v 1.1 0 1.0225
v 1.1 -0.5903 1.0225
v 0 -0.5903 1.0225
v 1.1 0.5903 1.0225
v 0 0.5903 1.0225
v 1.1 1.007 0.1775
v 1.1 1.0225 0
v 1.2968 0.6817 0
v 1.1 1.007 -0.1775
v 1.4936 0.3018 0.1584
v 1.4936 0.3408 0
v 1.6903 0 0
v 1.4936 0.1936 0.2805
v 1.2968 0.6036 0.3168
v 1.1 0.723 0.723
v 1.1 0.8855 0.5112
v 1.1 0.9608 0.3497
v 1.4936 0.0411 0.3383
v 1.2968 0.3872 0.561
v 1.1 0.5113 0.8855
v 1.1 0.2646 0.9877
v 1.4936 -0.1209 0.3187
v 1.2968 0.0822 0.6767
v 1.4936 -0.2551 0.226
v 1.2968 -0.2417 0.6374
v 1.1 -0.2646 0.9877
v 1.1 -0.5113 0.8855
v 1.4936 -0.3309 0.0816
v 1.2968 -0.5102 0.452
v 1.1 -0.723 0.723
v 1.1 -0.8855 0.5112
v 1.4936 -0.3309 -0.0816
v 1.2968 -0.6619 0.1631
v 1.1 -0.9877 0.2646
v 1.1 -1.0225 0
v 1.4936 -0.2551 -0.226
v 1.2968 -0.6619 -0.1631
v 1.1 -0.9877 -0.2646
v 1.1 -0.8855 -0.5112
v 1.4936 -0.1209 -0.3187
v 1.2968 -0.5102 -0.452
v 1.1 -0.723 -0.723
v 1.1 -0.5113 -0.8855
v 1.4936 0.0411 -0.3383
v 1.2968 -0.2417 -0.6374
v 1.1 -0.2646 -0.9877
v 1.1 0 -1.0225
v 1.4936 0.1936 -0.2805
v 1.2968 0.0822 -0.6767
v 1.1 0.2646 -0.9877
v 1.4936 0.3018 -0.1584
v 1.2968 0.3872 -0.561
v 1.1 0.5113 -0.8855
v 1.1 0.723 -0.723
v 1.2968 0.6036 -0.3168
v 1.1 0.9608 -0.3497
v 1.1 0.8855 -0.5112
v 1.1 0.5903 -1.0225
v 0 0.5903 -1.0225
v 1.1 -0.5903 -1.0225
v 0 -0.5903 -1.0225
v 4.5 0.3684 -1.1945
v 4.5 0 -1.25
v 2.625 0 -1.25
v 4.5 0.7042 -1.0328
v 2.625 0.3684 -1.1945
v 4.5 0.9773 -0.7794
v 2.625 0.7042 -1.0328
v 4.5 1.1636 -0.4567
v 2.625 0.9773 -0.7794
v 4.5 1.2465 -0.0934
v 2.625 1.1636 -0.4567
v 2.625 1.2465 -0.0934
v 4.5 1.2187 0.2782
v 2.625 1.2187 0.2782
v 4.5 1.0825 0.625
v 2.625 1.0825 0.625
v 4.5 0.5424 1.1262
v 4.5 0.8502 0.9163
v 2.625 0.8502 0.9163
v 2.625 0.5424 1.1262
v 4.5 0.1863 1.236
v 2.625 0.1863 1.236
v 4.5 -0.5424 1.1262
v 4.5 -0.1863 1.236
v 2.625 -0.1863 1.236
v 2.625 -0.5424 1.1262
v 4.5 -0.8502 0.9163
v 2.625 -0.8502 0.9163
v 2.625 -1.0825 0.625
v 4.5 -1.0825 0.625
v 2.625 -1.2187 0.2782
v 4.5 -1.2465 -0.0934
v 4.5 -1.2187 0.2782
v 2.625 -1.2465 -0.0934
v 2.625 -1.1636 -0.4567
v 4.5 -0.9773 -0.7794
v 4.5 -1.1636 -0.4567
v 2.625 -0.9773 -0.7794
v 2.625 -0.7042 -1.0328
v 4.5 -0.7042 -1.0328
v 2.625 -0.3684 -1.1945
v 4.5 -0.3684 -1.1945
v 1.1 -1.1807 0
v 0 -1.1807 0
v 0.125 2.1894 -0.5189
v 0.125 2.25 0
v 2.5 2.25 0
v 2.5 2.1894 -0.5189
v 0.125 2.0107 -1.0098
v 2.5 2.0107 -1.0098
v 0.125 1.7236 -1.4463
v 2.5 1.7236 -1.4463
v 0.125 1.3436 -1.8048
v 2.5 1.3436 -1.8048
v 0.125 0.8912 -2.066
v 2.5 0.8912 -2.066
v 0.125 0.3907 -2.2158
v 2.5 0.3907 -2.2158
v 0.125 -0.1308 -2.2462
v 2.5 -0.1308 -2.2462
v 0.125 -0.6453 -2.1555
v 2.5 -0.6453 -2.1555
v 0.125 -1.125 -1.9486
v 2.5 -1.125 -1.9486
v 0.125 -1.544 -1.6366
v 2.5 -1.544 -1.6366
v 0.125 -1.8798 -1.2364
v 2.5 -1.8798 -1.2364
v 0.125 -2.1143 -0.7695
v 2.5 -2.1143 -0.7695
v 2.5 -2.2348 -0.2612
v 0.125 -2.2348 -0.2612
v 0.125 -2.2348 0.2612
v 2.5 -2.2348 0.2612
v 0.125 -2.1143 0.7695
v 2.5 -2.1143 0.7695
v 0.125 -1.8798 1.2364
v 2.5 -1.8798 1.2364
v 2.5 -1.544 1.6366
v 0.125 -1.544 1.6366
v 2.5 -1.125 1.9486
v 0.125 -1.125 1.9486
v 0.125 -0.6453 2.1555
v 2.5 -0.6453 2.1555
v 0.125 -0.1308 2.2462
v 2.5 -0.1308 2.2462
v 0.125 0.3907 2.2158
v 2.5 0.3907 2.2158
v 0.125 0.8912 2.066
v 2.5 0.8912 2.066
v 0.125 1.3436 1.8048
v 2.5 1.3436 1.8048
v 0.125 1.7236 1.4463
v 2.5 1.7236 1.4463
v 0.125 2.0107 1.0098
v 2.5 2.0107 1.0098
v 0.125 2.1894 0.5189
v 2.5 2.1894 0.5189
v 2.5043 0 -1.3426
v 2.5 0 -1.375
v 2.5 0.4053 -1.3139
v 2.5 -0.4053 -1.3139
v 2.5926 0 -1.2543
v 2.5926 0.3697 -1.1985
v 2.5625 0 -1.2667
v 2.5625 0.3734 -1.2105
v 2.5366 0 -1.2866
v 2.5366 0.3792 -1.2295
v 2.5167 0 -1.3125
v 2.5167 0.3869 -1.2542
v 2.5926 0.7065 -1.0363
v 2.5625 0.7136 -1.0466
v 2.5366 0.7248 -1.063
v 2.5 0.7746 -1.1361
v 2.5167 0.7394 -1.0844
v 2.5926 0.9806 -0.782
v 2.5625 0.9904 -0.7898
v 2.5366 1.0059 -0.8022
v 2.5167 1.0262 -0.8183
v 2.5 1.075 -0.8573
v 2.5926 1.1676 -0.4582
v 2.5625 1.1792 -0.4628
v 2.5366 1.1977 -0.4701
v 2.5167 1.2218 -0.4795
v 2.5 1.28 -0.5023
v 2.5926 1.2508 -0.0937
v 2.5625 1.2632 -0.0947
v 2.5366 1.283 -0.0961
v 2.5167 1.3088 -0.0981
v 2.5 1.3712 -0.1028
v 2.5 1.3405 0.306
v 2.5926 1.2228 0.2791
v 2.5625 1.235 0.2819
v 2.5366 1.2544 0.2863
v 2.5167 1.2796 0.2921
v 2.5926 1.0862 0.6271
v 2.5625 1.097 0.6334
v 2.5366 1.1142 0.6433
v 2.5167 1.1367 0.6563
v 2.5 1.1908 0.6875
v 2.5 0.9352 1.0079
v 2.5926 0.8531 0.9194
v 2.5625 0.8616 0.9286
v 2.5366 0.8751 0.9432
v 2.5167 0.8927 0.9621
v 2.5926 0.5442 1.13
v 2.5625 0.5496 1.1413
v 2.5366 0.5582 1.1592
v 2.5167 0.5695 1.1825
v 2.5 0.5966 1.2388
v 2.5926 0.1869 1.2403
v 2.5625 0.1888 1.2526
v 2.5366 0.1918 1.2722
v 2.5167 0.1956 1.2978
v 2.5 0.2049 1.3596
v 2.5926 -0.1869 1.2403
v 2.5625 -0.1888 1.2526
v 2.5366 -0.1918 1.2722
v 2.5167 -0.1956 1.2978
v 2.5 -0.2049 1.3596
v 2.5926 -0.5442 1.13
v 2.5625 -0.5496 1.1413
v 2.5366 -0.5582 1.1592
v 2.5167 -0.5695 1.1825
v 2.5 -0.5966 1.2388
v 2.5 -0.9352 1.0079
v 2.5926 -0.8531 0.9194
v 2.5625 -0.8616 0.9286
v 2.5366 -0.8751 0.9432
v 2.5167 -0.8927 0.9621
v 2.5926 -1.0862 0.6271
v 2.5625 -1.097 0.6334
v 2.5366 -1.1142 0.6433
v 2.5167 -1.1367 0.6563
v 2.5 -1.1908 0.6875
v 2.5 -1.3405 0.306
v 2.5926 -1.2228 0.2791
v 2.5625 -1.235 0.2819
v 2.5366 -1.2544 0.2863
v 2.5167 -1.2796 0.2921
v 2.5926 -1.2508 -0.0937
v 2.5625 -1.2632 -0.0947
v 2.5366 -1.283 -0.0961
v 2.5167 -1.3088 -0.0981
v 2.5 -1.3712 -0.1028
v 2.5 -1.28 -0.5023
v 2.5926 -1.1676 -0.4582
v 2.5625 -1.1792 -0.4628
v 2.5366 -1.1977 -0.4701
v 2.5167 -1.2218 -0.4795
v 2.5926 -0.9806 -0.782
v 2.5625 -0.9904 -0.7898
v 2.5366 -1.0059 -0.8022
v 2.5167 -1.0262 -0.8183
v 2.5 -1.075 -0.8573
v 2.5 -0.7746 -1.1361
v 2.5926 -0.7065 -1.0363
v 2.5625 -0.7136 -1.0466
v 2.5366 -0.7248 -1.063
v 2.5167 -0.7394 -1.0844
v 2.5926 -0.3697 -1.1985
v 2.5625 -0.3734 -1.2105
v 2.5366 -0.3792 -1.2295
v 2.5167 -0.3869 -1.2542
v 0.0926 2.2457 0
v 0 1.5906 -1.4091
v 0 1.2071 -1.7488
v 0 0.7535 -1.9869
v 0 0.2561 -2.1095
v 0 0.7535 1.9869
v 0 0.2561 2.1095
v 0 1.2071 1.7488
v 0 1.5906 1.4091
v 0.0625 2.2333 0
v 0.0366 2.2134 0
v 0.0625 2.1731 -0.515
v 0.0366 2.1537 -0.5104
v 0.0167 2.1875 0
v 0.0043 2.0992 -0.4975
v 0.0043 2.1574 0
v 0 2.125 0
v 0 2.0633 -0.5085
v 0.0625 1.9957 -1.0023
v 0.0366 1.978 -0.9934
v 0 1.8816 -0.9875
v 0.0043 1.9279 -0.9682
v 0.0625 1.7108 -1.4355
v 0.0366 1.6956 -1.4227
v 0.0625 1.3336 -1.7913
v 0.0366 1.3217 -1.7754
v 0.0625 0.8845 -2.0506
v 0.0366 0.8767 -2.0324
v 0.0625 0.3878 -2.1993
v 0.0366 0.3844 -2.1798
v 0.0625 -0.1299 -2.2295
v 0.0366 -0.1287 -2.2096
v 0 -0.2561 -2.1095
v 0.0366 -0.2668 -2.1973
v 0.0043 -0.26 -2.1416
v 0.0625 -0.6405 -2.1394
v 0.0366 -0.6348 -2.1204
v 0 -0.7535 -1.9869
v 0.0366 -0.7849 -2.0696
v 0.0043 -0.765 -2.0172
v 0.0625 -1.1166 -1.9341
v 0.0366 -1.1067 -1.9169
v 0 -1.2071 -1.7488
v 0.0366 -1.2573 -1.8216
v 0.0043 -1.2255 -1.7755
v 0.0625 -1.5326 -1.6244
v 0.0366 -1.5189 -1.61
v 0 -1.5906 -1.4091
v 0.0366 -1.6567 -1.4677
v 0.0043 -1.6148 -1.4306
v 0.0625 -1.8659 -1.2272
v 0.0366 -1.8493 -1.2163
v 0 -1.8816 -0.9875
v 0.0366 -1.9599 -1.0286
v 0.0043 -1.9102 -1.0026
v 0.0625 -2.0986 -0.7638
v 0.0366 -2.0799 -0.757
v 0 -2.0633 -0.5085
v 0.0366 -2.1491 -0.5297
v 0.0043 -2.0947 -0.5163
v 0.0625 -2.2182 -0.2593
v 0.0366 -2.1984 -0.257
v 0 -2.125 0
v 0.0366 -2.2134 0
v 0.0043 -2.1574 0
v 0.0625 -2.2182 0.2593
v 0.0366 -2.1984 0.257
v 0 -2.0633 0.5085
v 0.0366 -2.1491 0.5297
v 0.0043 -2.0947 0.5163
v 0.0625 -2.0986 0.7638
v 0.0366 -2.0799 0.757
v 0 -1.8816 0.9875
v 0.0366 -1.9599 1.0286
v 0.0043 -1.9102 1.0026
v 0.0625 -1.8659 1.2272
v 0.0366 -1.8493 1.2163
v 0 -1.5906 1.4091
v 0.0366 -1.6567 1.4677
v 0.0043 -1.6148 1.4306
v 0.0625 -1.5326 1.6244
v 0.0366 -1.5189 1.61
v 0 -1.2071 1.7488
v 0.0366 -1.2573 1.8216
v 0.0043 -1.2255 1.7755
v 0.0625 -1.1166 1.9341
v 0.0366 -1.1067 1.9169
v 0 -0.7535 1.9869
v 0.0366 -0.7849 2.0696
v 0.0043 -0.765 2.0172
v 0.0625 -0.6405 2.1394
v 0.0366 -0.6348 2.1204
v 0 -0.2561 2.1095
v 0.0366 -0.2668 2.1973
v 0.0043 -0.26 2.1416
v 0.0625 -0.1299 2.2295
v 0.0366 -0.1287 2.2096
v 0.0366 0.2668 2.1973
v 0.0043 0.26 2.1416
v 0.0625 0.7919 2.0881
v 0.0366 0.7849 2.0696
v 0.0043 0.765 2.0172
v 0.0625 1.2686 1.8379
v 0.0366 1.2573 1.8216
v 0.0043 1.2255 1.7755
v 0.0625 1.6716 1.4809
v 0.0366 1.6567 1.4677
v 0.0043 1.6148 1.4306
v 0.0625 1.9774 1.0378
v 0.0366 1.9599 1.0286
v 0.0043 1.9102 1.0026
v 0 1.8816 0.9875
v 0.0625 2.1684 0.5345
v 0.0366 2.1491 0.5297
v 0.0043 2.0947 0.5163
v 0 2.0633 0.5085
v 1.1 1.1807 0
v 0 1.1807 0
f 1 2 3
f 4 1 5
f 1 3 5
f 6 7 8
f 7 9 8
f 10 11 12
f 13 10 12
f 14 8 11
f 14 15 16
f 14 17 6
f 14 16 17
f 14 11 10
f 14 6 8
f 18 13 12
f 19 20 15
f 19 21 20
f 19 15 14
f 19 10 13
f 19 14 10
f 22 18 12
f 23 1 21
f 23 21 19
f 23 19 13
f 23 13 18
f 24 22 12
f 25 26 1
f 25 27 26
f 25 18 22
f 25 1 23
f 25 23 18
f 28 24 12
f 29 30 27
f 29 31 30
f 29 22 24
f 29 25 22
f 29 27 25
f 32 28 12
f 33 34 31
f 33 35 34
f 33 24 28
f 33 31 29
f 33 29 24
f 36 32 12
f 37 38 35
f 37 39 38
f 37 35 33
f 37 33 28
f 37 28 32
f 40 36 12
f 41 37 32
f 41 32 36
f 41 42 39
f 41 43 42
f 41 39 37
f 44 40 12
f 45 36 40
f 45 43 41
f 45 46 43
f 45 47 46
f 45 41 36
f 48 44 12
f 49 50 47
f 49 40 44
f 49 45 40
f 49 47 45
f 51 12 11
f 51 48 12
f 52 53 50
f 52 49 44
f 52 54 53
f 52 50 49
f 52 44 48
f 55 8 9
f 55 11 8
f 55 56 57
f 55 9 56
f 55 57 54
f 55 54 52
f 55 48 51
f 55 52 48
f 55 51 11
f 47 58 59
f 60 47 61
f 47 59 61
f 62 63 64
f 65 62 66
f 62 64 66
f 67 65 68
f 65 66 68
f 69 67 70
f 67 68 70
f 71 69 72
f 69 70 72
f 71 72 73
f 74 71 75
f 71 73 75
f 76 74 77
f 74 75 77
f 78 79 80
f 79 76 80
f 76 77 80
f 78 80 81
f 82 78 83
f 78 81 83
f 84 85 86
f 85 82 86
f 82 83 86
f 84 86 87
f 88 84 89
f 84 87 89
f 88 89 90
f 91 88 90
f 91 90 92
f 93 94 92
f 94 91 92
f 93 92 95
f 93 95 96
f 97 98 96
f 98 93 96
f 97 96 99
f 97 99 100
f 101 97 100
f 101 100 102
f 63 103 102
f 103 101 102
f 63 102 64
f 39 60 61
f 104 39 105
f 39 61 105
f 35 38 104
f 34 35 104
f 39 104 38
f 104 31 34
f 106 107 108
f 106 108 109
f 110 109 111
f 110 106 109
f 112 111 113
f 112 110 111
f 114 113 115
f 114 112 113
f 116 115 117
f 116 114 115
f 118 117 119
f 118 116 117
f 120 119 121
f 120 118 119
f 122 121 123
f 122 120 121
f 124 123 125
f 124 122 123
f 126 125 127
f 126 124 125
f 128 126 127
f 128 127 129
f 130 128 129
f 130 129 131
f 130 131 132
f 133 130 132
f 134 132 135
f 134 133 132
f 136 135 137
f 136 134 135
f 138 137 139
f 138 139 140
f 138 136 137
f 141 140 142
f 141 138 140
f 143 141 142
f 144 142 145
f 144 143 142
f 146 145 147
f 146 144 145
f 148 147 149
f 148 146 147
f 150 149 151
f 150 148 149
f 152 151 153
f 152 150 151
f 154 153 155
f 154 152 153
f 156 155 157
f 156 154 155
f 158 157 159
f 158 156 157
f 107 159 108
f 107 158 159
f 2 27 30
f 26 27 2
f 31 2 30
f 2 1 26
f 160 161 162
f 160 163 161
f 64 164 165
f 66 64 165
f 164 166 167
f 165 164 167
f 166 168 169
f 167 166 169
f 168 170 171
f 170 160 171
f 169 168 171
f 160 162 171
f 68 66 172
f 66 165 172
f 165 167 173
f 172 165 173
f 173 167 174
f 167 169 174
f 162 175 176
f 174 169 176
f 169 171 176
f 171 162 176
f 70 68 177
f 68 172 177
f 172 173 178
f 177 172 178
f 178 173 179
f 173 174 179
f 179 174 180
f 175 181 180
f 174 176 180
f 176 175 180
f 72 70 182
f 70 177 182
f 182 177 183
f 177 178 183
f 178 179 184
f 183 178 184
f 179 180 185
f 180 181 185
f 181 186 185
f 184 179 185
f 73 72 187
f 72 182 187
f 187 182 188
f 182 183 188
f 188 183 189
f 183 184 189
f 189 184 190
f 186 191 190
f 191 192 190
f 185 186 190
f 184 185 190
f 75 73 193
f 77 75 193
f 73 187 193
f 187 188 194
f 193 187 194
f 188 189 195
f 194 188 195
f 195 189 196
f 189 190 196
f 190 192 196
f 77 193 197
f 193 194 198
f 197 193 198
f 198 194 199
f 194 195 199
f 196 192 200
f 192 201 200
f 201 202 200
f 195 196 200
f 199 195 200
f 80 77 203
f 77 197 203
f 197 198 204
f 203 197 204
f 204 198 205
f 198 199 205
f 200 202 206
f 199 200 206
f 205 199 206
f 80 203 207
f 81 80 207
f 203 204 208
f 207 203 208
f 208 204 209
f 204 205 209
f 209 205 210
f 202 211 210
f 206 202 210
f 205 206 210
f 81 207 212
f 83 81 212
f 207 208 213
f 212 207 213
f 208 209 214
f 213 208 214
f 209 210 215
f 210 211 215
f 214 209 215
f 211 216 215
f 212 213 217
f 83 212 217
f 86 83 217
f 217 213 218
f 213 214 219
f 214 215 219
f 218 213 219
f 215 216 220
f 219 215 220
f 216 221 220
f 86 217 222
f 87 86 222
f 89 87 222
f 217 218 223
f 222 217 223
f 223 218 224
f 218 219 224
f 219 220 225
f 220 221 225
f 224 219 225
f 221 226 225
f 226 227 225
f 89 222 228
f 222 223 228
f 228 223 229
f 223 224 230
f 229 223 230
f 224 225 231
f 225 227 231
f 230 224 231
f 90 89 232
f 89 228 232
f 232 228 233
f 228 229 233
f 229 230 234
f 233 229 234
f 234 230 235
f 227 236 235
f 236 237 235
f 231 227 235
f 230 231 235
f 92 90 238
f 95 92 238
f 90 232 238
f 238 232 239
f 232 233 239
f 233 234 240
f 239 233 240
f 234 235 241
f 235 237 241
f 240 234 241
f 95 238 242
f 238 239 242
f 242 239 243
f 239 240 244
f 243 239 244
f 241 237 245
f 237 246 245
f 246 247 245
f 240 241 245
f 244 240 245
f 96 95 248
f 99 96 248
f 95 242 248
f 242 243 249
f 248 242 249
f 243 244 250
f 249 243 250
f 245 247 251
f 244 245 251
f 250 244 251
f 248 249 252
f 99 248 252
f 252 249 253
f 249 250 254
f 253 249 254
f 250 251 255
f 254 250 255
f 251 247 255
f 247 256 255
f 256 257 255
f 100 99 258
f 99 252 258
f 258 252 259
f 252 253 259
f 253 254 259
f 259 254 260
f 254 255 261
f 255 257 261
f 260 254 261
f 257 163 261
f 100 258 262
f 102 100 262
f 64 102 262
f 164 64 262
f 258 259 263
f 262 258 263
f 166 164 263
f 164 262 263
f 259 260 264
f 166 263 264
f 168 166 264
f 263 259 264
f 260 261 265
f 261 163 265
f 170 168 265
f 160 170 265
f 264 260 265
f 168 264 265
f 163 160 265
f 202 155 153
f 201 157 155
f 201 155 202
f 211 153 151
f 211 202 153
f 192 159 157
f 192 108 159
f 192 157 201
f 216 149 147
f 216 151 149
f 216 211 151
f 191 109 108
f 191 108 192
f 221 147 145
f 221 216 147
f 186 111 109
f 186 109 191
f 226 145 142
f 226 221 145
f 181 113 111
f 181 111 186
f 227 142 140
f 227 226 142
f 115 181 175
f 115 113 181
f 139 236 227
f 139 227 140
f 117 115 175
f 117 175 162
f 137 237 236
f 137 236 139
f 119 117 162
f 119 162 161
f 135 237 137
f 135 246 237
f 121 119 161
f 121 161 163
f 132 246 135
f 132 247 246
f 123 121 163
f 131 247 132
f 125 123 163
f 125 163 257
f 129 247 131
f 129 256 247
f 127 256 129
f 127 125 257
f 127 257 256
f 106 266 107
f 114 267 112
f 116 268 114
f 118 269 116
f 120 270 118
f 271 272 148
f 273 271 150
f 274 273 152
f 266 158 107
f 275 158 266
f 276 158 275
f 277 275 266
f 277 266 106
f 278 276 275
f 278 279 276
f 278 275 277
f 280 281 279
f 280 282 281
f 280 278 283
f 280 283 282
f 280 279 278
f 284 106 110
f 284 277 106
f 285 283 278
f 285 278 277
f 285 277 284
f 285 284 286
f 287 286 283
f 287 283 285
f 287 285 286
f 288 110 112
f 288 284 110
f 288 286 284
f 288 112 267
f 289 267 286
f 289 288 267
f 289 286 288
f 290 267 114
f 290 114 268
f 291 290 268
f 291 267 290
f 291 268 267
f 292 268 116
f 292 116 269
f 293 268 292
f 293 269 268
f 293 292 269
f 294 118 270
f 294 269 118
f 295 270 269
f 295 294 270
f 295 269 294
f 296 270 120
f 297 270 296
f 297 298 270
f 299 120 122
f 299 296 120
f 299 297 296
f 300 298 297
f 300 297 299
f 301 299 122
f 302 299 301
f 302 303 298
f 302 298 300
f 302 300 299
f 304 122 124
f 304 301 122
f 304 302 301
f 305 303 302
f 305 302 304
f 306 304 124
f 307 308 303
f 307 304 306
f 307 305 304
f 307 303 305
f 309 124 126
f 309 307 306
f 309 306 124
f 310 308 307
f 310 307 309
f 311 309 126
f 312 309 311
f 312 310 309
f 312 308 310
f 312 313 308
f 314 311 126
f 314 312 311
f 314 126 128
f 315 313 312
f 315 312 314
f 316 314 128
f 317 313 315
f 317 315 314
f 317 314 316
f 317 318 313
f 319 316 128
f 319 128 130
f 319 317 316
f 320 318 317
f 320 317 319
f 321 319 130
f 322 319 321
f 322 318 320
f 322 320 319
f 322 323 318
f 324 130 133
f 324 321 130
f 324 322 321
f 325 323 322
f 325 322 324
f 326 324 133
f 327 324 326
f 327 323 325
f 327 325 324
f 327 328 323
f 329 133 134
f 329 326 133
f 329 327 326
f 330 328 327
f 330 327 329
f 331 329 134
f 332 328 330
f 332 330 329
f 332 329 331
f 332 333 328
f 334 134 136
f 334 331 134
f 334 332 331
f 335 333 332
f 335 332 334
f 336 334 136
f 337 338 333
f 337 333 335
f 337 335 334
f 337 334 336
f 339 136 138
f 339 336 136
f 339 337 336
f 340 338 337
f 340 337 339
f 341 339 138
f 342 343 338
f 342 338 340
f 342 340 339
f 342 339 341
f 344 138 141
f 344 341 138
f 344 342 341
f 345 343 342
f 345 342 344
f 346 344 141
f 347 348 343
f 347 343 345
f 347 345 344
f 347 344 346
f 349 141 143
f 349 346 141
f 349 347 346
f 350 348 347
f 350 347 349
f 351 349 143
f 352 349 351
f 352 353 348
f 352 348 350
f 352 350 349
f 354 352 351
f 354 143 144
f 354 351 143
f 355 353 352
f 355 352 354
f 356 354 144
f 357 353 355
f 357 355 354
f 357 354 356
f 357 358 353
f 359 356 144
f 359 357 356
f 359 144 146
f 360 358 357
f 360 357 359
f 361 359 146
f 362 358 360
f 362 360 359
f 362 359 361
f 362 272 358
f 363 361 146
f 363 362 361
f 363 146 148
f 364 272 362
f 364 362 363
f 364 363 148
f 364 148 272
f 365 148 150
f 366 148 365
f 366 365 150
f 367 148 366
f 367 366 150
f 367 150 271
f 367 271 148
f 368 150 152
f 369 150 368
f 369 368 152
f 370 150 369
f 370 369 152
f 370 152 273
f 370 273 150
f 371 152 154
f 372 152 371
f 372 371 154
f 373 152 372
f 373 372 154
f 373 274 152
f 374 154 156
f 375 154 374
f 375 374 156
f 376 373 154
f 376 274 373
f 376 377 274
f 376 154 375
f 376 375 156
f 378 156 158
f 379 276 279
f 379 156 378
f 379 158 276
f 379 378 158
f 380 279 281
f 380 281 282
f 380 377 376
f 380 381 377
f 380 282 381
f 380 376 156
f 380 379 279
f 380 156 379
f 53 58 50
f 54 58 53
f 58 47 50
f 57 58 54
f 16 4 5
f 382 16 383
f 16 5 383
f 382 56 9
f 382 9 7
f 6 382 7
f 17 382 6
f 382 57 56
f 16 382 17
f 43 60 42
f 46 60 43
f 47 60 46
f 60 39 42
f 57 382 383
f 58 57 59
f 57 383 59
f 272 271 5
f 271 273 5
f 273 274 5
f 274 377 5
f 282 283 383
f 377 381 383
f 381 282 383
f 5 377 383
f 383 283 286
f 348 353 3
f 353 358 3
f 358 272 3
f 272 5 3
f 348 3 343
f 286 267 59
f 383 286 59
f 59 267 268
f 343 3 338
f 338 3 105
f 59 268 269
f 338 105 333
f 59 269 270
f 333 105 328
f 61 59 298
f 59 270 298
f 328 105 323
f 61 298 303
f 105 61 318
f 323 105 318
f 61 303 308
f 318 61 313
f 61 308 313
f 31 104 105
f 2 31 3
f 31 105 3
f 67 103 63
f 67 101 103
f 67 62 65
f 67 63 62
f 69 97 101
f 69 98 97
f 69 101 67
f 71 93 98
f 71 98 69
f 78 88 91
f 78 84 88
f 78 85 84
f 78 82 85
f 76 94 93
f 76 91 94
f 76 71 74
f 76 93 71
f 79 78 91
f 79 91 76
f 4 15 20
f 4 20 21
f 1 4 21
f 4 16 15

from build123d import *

# Parameters (mm, degrees)
SKETCH1_W               = 2.5
SKETCH1_H               = 2.25
SKETCH2_R               = 1.25
BOSS_EXTRUDE1_DEPTH     = 8
CUT_EXTRUDE1_DEPTH      = 1.1
CHAMFER1_SIZE           = 0.2535
FILLET1_R               = 0.125
SKETCH5_W               = 6
SKETCH5_H               = 4.609791228
CUT_EXTRUDE2_DEPTH      = 10
CUT_EXTRUDE2_DEPTH_BACK = 10


with BuildPart() as part:
    # Sketch1 → Revolve1 (revolve)
    with BuildSketch(Plane(origin=(0, 0, 0), x_dir=(-1, 0, 0), z_dir=(0, 0, -1))):
        with Locations((-1.25, 1.125)):
            Rectangle(SKETCH1_W, SKETCH1_H)
    revolve(axis=Axis((2.5, 0, 0), (-1, 0, 0)))

    # Sketch2 → Boss-Extrude1 (add)
    with BuildSketch(Plane(origin=(2.5, 0, 0), x_dir=(0, 0, -1), z_dir=(1, 0, 0))):
        Circle(SKETCH2_R)
    extrude(amount=BOSS_EXTRUDE1_DEPTH)

    # Sketch3 → Cut-Extrude1 (cut)
    with BuildSketch(Plane.ZY):
        Polygon((-1.0225, -0.59034065), (0, -1.1806813), (1.0225, -0.59034065), (1.0225, 0.59034065), (0, 1.1806813), (-1.0225, 0.59034065), align=None)
    extrude(amount=-CUT_EXTRUDE1_DEPTH, mode=Mode.SUBTRACT)

    # Sketch4 → Cut-Revolve1 (revolve, cut)
    with BuildSketch(Plane.XY):
        Polygon((1.1, 1.0225), (1.1, 0), (1.69034065, 0), align=None)
    revolve(axis=Axis((1.099975, 0, 0), (1, 0, 0)), mode=Mode.SUBTRACT)

    # Chamfer1
    chamfer1_edges = [part.edges().sort_by_distance(p)[0] for p in [
        (10.5, 0, 1.25),
    ]]
    chamfer(chamfer1_edges, length=CHAMFER1_SIZE)

    # Fillet1
    fillet1_edges = [part.edges().sort_by_distance(p)[0] for p in [
        (0, -2.25, 0),
        (2.5, 0, 1.25),
    ]]
    fillet(fillet1_edges, radius=FILLET1_R)

    # Sketch5 → Cut-Extrude2 (cut, two sides)
    with BuildSketch(Plane.XY) as cut_extrude2_sk:
        with Locations((7.5, -0.404062901)):
            Rectangle(SKETCH5_W, SKETCH5_H)
    extrude(amount=CUT_EXTRUDE2_DEPTH, mode=Mode.SUBTRACT)
    extrude(cut_extrude2_sk.sketch, amount=-CUT_EXTRUDE2_DEPTH_BACK, mode=Mode.SUBTRACT)


solid = part.part
